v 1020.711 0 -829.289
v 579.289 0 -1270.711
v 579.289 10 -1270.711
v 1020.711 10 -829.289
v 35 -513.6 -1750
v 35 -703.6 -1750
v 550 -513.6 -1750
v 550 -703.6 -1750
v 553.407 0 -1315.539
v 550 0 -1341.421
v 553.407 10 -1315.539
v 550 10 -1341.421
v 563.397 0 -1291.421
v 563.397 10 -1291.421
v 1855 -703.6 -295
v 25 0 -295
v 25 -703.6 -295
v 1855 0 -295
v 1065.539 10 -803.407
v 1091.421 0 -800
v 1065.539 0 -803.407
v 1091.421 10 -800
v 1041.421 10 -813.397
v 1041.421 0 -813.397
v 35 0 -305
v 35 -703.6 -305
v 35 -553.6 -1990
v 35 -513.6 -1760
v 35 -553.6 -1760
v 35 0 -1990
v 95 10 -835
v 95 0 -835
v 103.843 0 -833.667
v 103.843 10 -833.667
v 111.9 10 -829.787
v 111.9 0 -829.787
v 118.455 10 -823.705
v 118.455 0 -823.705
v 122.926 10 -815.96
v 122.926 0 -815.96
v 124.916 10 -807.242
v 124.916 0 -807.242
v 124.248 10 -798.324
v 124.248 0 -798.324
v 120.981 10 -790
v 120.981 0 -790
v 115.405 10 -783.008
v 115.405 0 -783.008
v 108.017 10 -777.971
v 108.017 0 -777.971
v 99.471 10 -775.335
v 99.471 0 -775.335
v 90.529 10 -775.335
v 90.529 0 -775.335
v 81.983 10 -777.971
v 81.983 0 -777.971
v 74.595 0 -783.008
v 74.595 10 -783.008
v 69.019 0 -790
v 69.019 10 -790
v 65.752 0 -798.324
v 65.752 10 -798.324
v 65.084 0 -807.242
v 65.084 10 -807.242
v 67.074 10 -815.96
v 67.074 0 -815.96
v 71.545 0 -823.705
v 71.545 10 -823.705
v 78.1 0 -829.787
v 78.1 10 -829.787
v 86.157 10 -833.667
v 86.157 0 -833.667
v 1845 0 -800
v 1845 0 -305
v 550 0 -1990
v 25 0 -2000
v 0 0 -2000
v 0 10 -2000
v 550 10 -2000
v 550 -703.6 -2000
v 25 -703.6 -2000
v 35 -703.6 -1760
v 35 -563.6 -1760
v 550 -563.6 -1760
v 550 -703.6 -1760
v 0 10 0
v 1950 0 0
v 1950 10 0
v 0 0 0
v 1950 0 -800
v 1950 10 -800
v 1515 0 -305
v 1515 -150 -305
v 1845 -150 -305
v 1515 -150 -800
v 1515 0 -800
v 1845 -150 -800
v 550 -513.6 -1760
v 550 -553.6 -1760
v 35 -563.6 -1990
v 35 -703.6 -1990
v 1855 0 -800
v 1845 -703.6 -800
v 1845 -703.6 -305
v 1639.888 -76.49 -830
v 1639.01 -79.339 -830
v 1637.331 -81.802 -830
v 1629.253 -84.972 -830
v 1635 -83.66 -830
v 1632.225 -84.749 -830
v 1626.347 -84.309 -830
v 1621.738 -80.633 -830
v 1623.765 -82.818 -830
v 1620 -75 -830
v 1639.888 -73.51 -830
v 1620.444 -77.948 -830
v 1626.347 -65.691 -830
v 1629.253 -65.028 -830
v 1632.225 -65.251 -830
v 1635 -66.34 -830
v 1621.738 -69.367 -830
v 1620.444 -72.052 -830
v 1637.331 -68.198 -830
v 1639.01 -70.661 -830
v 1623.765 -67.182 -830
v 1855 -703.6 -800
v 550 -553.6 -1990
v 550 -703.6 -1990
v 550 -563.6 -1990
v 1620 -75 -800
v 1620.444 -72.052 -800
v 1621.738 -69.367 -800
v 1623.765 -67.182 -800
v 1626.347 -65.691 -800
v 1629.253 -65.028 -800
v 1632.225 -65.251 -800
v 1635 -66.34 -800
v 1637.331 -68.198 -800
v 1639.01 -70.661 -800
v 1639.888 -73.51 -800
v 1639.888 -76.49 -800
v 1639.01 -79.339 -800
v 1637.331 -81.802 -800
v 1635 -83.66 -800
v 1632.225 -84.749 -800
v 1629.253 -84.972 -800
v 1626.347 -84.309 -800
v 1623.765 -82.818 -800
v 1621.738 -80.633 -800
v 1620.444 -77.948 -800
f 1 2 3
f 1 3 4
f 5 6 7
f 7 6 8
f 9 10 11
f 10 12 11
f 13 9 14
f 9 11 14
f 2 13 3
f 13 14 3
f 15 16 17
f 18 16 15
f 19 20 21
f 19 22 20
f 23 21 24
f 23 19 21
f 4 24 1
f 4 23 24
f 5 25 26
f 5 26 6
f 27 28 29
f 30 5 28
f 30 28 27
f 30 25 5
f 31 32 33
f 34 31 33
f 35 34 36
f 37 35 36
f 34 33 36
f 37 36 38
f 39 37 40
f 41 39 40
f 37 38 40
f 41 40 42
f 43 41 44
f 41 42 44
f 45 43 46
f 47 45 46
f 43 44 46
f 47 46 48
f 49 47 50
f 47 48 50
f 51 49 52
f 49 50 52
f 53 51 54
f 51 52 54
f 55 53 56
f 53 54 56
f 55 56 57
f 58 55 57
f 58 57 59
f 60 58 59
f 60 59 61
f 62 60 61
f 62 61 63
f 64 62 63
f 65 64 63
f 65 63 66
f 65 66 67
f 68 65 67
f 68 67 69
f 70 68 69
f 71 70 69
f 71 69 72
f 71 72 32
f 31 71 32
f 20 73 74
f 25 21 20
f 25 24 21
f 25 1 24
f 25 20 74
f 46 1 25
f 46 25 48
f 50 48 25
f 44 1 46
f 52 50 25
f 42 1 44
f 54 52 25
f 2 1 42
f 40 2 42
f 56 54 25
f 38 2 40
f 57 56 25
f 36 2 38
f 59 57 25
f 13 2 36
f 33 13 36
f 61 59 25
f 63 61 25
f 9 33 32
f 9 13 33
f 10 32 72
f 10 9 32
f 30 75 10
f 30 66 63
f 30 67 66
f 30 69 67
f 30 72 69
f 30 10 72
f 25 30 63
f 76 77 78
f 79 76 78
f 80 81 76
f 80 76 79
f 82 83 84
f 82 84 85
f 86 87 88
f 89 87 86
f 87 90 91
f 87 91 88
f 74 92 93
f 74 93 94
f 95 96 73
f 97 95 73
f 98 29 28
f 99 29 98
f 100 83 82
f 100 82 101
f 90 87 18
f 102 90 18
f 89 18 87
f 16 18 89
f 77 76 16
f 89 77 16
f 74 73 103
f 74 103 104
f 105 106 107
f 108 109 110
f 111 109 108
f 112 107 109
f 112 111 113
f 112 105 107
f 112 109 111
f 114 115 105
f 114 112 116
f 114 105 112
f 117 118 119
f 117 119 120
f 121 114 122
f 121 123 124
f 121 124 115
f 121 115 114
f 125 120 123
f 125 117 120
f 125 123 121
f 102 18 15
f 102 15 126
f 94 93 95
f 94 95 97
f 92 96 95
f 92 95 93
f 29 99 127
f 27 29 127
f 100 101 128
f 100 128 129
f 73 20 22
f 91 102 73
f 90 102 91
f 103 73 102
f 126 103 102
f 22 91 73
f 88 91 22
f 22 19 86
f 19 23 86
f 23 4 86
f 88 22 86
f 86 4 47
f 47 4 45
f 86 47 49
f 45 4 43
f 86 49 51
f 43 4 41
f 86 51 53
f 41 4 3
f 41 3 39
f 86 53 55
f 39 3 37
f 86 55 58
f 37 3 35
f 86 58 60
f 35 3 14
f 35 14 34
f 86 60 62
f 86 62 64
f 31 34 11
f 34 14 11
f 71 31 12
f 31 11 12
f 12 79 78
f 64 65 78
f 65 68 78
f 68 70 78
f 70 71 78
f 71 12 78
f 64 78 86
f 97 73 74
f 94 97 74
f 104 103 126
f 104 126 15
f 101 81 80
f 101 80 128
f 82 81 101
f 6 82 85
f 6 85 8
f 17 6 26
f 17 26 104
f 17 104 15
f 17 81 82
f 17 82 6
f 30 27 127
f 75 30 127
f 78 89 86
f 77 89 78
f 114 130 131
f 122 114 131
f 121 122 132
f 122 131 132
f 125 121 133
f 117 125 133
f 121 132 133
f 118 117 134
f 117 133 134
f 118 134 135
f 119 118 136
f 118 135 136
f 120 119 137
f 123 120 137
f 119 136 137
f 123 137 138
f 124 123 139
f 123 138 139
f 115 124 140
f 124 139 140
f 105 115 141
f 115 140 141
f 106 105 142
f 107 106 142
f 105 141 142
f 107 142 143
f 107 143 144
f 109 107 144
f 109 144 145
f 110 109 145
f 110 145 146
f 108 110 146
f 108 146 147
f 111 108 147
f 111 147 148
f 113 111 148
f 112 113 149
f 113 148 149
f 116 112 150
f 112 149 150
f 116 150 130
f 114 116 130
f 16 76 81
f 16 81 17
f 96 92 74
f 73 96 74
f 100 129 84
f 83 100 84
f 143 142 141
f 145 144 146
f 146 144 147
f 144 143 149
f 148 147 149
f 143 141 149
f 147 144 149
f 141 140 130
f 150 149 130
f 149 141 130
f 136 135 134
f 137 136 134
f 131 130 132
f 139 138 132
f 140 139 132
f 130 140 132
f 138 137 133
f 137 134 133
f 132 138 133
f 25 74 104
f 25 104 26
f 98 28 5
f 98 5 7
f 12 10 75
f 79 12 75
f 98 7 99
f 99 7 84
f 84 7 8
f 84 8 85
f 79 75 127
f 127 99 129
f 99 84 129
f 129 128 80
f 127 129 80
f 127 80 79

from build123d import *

# Parameters (mm, degrees)
SALIENTE_EXTRUIR1_DEPTH = 10
SALIENTE_EXTRUIR2_DEPTH = 703.6
CROQUIS3_R              = 30
CORTAR_EXTRUIR1_DEPTH   = 2881.547336879
REDONDEO1_R             = 100
SALIENTE_EXTRUIR3_DEPTH = 515
CROQUIS5_W              = 515
CROQUIS5_H              = 10
SALIENTE_EXTRUIR4_DEPTH = 40
CROQUIS6_W              = 330
CROQUIS6_H              = 495
SALIENTE_EXTRUIR5_DEPTH = 150
CROQUIS7_R              = 10
SALIENTE_EXTRUIR6_DEPTH = 30
CROQUIS8_W              = 515
CROQUIS8_H              = 10
SALIENTE_EXTRUIR7_DEPTH = 513.6


with BuildPart() as part:
    # Croquis1 → Saliente-Extruir1 (new body)
    with BuildSketch(Plane(origin=(0, 0, 0), x_dir=(1, 0, 0), z_dir=(0, 1, 0))):
        Polygon((0, 0), (0, 2000), (550, 2000), (550, 1300), (1050, 800), (1950, 800), (1950, 0), align=None)
    extrude(amount=SALIENTE_EXTRUIR1_DEPTH)

    # Croquis2 → Saliente-Extruir2 (add)
    with BuildSketch(Plane.XZ):
        Polygon((25, -295), (1855, -295), (1855, -800), (1845, -800), (1845, -305), (35, -305), (35, -2000), (25, -2000), align=None)
    extrude(amount=SALIENTE_EXTRUIR2_DEPTH)

    # Croquis3 → Cortar-Extruir1 (cut, through all)
    with BuildSketch(Plane.XZ):
        with Locations(Location((95, -805, 0), (0, 0, 270))):
            Circle(CROQUIS3_R)
    extrude(amount=-CORTAR_EXTRUIR1_DEPTH, mode=Mode.SUBTRACT)

    # Redondeo1
    redondeo1_edges = [part.edges().sort_by_distance(p)[0] for p in [
        (550, 5, -1300),
        (1050, 5, -800),
    ]]
    fillet(redondeo1_edges, radius=REDONDEO1_R)

    # Croquis4 → Saliente-Extruir3 (add)
    with BuildSketch(Plane(origin=(35, 0, 0), x_dir=(0, 0, -1), z_dir=(1, 0, 0))):
        Polygon((1750, -703.6), (1750, -553.6), (2000, -553.6), (2000, -703.6), (1990, -703.6), (1990, -563.6), (1760, -563.6), (1760, -703.6), align=None)
    extrude(amount=SALIENTE_EXTRUIR3_DEPTH)

    # Croquis5 → Saliente-Extruir4 (add)
    with BuildSketch(Plane(origin=(0, -553.6, 0), x_dir=(1, 0, 0), z_dir=(0, 1, 0))):
        with Locations((292.5, 1995)):
            Rectangle(CROQUIS5_W, CROQUIS5_H)
        with Locations((292.5, 1755)):
            Rectangle(CROQUIS5_W, CROQUIS5_H)
    extrude(amount=SALIENTE_EXTRUIR4_DEPTH)

    # Croquis8 → Saliente-Extruir7 (add)
    with BuildSketch(Plane(origin=(0, -513.6, 0), x_dir=(1, 0, 0), z_dir=(0, 1, 0))):
        with Locations((292.5, 1995)):
            Rectangle(CROQUIS8_W, CROQUIS8_H)
    extrude(amount=SALIENTE_EXTRUIR7_DEPTH)


with BuildPart() as body_2:
    # Croquis6 → Saliente-Extruir5 (new body)
    with BuildSketch(Plane.XZ):
        with Locations((1680, -552.5)):
            Rectangle(CROQUIS6_W, CROQUIS6_H)
    extrude(amount=SALIENTE_EXTRUIR5_DEPTH)


with BuildPart() as body_3:
    # Croquis7 → Saliente-Extruir6 (new body)
    with BuildSketch(Plane(origin=(0, 0, -800), x_dir=(-1, 0, 0), z_dir=(0, 0, -1))):
        with Locations((-1630, -75)):
            Circle(CROQUIS7_R)
    extrude(amount=SALIENTE_EXTRUIR6_DEPTH)


solid = Compound([part.part, body_2.part, body_3.part])
